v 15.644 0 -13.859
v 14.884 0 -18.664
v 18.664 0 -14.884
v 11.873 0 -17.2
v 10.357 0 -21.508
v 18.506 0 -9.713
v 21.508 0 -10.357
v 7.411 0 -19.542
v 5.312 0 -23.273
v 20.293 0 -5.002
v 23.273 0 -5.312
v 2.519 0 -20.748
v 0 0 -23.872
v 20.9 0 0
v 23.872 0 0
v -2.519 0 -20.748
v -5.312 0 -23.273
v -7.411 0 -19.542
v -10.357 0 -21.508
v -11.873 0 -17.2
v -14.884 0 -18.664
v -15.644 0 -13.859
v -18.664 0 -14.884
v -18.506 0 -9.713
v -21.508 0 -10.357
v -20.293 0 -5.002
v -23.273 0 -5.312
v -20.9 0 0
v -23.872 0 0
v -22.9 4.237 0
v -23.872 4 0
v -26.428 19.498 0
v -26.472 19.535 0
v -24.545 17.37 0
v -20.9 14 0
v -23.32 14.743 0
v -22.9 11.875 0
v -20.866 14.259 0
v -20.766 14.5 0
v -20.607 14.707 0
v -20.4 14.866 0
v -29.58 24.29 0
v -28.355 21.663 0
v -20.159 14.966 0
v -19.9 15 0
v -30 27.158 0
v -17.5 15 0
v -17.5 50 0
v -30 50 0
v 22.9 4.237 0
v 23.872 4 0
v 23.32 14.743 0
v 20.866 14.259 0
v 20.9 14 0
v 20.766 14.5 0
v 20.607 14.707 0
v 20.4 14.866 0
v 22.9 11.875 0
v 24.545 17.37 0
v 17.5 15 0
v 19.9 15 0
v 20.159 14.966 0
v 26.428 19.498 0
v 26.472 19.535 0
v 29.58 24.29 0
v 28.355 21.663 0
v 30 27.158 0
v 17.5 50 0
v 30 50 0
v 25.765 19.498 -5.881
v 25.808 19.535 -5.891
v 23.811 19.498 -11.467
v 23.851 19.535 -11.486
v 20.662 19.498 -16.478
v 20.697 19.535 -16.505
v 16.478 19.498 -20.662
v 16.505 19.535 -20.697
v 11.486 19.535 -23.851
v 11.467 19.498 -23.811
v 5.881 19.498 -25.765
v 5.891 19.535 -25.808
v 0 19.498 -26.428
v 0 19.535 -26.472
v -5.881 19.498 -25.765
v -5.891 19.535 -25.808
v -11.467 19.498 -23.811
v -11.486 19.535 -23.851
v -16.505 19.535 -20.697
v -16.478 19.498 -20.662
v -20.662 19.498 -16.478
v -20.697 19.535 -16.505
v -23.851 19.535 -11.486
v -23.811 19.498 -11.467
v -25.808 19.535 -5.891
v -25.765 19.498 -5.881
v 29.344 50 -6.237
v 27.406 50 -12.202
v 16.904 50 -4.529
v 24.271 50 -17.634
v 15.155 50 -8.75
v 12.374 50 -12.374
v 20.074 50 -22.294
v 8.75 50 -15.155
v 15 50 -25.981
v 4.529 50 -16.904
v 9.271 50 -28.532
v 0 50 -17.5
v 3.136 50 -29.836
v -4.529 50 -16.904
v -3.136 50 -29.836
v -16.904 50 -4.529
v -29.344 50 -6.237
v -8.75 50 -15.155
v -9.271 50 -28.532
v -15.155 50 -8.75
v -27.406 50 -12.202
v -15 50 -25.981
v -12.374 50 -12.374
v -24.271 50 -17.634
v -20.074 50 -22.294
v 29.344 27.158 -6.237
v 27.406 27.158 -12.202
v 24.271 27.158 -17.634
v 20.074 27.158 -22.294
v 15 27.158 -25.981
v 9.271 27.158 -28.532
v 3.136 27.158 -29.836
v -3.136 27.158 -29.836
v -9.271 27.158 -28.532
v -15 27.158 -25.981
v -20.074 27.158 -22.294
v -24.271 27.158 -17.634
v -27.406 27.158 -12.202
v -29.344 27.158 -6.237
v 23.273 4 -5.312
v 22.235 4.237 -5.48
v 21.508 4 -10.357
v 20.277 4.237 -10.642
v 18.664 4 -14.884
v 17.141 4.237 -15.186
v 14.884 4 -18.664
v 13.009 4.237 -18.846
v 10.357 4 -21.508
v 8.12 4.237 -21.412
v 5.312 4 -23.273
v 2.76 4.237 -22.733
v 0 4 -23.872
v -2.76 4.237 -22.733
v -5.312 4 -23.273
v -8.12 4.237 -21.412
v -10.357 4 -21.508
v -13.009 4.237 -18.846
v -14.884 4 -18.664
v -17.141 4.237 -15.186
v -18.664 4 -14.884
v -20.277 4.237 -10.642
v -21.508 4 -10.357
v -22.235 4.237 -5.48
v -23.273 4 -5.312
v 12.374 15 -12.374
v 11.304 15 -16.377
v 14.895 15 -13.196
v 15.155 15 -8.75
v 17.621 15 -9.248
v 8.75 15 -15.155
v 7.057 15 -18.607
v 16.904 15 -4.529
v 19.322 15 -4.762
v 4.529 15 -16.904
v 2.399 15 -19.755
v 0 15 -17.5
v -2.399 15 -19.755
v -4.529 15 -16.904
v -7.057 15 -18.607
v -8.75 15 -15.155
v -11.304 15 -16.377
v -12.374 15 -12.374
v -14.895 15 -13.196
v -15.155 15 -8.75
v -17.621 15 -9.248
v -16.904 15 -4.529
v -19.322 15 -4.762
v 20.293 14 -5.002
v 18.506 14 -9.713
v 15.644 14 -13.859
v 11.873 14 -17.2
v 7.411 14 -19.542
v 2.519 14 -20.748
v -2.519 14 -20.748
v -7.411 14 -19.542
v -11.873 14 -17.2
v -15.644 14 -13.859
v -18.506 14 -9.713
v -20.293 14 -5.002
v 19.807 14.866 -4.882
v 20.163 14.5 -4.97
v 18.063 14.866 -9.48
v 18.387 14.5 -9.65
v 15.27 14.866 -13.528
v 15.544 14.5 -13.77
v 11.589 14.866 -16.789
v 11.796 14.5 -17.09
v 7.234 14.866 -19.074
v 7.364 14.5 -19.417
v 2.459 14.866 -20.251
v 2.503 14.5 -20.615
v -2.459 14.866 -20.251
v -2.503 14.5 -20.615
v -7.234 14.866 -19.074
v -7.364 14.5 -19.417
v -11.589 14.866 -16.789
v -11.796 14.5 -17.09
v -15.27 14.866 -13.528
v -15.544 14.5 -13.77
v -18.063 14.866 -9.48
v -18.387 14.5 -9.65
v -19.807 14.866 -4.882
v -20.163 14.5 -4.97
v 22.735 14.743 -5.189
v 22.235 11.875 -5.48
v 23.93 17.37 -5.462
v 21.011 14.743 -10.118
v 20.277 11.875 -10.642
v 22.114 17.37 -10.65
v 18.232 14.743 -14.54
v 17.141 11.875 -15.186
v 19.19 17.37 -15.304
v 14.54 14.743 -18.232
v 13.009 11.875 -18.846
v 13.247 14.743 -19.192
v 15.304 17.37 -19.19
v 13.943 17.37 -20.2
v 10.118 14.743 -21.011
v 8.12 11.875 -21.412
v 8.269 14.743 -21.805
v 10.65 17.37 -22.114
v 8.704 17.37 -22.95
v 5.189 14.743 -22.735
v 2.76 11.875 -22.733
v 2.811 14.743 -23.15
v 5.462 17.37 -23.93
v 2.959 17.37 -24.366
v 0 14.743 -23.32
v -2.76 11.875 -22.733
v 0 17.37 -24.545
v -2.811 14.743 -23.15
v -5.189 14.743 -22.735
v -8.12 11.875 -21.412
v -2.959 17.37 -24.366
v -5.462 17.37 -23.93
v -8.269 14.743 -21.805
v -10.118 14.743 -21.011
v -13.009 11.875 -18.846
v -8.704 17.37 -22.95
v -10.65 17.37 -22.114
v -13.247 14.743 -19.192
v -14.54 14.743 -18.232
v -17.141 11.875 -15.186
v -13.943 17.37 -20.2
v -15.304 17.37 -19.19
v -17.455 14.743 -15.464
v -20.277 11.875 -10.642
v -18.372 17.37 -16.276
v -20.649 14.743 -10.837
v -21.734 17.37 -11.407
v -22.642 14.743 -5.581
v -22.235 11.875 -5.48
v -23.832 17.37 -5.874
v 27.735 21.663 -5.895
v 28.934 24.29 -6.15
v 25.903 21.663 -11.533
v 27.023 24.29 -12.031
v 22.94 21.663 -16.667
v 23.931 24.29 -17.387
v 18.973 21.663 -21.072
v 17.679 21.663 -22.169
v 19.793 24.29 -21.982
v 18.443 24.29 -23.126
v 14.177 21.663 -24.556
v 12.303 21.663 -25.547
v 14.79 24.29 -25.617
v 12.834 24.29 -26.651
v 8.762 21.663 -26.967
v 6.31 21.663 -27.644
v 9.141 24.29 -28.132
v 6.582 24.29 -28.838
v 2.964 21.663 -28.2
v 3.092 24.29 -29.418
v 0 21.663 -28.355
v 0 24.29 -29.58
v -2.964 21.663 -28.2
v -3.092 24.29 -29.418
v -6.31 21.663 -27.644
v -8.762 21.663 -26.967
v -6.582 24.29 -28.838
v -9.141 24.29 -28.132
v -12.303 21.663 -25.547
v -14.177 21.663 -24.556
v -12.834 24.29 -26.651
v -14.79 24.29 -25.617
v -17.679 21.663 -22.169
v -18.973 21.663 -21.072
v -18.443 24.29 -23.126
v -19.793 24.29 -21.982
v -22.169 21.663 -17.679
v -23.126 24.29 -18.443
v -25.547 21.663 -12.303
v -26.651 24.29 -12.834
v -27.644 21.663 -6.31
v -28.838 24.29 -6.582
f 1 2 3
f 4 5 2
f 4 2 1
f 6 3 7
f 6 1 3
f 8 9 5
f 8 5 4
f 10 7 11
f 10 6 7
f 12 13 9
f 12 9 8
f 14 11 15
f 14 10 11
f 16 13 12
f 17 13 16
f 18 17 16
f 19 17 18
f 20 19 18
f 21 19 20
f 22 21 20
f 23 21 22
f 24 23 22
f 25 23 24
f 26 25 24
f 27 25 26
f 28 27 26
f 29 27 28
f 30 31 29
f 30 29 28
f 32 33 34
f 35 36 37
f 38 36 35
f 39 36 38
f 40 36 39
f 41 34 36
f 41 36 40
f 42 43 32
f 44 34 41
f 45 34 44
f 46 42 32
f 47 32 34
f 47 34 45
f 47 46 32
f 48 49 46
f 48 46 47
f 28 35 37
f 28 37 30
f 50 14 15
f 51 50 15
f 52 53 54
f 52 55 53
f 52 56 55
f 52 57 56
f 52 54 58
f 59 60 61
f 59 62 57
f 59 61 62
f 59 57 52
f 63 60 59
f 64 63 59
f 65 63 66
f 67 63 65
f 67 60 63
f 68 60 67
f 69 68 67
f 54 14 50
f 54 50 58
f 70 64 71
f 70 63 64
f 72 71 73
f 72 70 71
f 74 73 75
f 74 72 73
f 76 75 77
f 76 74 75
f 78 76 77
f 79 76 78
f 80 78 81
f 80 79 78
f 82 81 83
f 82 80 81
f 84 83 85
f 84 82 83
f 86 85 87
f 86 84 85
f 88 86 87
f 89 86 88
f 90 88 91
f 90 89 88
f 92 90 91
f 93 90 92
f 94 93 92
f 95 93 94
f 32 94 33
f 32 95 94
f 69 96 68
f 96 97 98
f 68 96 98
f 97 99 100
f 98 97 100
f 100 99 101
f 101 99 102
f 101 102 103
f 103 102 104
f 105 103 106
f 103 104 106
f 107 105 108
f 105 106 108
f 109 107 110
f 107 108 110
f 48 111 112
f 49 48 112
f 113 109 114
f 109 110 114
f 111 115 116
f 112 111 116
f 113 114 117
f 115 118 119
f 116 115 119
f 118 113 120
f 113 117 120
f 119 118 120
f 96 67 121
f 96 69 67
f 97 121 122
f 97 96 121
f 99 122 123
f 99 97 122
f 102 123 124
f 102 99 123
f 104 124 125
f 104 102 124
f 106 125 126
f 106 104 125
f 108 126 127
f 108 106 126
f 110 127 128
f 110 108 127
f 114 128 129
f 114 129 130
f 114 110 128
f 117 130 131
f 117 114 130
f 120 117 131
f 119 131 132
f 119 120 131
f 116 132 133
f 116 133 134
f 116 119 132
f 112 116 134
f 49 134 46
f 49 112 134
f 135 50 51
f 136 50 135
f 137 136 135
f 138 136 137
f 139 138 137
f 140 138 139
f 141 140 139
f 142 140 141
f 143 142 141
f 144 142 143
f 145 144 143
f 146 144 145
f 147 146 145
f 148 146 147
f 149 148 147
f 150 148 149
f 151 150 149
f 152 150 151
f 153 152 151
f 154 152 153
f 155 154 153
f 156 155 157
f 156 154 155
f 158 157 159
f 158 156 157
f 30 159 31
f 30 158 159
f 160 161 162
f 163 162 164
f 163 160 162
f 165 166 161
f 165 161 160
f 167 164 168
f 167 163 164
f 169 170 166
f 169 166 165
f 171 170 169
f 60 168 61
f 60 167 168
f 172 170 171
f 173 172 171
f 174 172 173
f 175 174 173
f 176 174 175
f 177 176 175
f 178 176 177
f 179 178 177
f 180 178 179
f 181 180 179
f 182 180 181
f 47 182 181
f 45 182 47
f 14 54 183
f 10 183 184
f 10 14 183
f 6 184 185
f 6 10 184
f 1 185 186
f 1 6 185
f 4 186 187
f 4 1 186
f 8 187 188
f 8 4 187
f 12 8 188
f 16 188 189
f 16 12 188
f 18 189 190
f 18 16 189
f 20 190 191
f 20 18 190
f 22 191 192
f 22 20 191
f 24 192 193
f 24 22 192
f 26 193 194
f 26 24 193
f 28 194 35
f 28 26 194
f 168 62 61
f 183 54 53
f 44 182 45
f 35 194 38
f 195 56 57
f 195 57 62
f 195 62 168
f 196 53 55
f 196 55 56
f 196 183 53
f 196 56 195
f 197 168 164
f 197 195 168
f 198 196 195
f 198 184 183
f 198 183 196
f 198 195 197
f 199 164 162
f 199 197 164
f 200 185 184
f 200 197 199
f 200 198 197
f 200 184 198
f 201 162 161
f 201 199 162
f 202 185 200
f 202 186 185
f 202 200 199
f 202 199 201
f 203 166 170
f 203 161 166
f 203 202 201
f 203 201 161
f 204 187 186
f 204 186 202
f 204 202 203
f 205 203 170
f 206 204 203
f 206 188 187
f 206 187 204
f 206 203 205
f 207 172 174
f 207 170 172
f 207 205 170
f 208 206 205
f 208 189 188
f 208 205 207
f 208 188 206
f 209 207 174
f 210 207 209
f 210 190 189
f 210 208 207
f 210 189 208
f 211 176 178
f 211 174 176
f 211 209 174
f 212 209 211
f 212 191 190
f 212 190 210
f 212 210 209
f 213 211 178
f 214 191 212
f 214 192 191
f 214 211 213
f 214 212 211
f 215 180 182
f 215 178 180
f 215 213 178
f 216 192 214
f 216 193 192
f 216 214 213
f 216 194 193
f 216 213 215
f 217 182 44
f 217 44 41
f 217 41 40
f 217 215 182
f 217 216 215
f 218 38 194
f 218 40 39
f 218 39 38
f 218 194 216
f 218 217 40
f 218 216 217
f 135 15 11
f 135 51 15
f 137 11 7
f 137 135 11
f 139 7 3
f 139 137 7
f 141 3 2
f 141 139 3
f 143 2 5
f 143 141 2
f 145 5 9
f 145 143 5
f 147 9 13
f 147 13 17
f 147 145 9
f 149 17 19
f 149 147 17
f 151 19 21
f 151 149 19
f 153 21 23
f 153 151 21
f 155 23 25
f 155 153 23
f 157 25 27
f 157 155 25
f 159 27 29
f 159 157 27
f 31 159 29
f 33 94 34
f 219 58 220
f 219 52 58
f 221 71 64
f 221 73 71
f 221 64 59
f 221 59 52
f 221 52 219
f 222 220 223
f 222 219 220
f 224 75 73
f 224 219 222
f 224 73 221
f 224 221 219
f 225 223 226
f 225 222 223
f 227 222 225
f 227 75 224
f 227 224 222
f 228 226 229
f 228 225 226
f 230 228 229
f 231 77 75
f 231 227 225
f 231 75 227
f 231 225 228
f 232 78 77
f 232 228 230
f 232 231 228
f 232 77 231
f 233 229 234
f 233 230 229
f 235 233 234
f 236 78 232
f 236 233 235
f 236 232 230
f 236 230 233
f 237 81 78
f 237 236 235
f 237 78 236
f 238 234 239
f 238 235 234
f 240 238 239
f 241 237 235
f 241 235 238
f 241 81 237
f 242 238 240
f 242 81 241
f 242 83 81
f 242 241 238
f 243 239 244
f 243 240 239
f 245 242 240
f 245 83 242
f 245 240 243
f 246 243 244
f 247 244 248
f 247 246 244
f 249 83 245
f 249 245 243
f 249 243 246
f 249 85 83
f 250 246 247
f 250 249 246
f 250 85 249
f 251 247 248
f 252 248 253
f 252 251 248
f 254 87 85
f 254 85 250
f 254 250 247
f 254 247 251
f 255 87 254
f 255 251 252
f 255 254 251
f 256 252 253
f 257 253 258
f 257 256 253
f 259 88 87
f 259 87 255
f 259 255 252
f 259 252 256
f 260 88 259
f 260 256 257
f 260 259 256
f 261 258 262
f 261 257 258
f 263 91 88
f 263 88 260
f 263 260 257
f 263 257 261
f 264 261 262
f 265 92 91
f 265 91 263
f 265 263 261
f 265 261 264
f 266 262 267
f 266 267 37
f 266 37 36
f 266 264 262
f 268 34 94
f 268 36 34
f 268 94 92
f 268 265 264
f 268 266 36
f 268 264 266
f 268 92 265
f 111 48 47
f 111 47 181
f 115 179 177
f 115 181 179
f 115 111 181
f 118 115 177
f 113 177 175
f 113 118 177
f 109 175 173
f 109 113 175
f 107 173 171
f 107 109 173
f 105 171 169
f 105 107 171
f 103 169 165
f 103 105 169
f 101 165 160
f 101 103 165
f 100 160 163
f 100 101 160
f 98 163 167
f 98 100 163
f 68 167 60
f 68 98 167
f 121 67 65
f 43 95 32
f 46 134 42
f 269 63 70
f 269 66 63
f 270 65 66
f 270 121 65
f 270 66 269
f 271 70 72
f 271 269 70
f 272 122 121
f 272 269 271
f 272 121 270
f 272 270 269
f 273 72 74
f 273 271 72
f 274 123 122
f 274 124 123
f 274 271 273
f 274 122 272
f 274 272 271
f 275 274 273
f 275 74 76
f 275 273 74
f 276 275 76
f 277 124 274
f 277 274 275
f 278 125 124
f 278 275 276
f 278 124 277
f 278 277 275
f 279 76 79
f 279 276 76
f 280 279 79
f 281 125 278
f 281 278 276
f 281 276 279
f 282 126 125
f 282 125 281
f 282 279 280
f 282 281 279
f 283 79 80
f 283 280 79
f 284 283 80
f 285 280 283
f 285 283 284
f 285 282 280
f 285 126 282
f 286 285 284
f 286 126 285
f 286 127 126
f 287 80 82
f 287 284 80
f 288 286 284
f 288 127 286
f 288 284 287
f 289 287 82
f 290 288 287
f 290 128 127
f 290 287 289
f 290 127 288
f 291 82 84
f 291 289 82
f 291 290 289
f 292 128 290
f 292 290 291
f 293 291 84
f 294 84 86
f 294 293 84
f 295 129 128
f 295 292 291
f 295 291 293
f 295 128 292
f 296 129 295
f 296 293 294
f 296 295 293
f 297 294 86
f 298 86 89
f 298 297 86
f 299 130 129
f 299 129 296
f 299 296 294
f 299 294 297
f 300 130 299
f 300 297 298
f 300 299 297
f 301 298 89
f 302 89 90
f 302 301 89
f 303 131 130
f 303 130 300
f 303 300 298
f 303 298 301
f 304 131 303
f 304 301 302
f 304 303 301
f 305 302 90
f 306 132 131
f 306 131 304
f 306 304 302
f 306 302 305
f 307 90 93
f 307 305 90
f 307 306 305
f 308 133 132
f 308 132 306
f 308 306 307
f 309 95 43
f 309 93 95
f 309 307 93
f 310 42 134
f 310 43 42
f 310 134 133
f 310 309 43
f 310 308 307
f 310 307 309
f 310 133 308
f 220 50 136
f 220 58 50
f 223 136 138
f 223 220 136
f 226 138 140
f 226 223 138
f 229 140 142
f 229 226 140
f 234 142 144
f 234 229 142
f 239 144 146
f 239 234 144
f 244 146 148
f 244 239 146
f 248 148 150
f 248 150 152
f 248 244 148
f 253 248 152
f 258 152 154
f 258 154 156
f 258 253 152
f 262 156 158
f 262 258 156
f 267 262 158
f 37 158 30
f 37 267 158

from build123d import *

# Parameters (mm, degrees)
CUT_EXTRUDE3_DEPTH           = 25
CUT_EXTRUDE3_DEPTH_BACK      = 40
CUT_EXTRUDE5_START           = -5
CUT_EXTRUDE5_DEPTH           = 5
BOSS_EXTRUDE2_DEPTH          = 5
SKETCH14_R                   = 1
BOSS_EXTRUDE3_DEPTH          = 3
BOSS_EXTRUDE4_START          = 3
SKETCH15_R                   = 1
BOSS_EXTRUDE4_DEPTH          = 3
CUT_EXTRUDE6_DEPTH           = 22
SKETCH17_W                   = 7
SKETCH17_H                   = 20.303986046
CUT_REVOLVE1_ANGLE           = 45
CUT_REVOLVE1_OTHER_WAY_ANGLE = 45
INTERSECT1_OUTLINE_W         = 62
INTERSECT1_OUTLINE_H         = 54
INTERSECT1_DEPTH             = 31
INTERSECT1_START             = -5
INTERSECT1_2_OUTLINE_W       = 12
INTERSECT1_2_OUTLINE_H       = 4
INTERSECT1_2_DEPTH           = 5


with BuildPart() as part:
    # Sketch1 → Revolve1 (revolve)
    with BuildSketch(Plane.XY, mode=Mode.PRIVATE) as revolve1_sk:
        with BuildLine():
            Line((20.9, 0), (23.871591838, 0))
            Line((23.871591838, 0), (23.871591838, 4))
            Line((23.871591838, 4), (22.9, 4.236662843))
            Line((22.9, 4.236662843), (22.9, 11.874576818))
            ThreePointArc((22.9, 11.874576818), (23.83692213, 16.100759435), (26.472123903, 19.535021249))
            Line((26.472123903, 19.535021249), (26.427876097, 19.497892931))
            ThreePointArc((26.427876097, 19.497892931), (29.06307787, 22.932154745), (30, 27.158337362))
            Line((30, 27.158337362), (30, 50))
            ThreePointArc((30, 50), (28.828427125, 52.828427125), (26, 54))
            Line((26, 54), (0, 54))
            Line((0, 54), (0, 15))
            Line((0, 15), (19.9, 15))
            ThreePointArc((19.9, 15), (20.607106781, 14.707106781), (20.9, 14))
            Line((20.9, 14), (20.9, 0))
        make_face()
    revolve(revolve1_sk.sketch.rotate(Axis((0, 0, 0), (0, 1, 0)), 90), axis=Axis((0, 0, 0), (0, 1, 0)))

    # Sketch11 → Cut-Extrude3 (cut, two sides: drawn at the far end of the back side and taken through both)
    with BuildSketch(Plane(origin=(0, 19.535021249, 0), x_dir=(-1, 0, 0), z_dir=(0, -1, 0)).offset(-CUT_EXTRUDE3_DEPTH_BACK)):
        with BuildLine():
            Line((-17.5, 0), (17.5, 0))
            ThreePointArc((17.5, 0), (0, 17.5), (-17.5, 0))
        make_face()
    extrude(amount=CUT_EXTRUDE3_DEPTH + CUT_EXTRUDE3_DEPTH_BACK, mode=Mode.SUBTRACT)

    # Sketch9 → Cut-Extrude5 (cut)
    with BuildSketch(Plane(origin=(0, 50, 0), x_dir=(-1, 0, 0), z_dir=(0, -1, 0)).offset(CUT_EXTRUDE5_START)):
        with BuildLine():
            Line((-30, 0), (30, 0))
            ThreePointArc((30, 0), (0, 30), (-30, 0))
        make_face()
    extrude(amount=CUT_EXTRUDE5_DEPTH, mode=Mode.SUBTRACT)

    # Sketch13 → Boss-Extrude2 (add)
    with BuildSketch(Plane(origin=(0, 0, 0), x_dir=(-1, 0, 0), z_dir=(0, 0, -1))):
        with BuildLine():
            Line((22.5, 53.5), (26.5, 53.5))
            ThreePointArc((26.5, 53.5), (26.853553391, 53.353553391), (27, 53))
            Line((27, 53), (27, 51))
            ThreePointArc((27, 51), (26.853553391, 50.646446609), (26.5, 50.5))
            Line((26.5, 50.5), (22.5, 50.5))
            ThreePointArc((22.5, 50.5), (22.146446609, 50.646446609), (22, 51))
            Line((22, 51), (22, 53))
            ThreePointArc((22, 53), (22.146446609, 53.353553391), (22.5, 53.5))
        make_face()
        with BuildLine():
            Line((-26.5, 53.5), (-22.5, 53.5))
            ThreePointArc((-22.5, 53.5), (-22.146446609, 53.353553391), (-22, 53))
            Line((-22, 53), (-22, 51))
            ThreePointArc((-22, 51), (-22.146446609, 50.646446609), (-22.5, 50.5))
            Line((-22.5, 50.5), (-26.5, 50.5))
            ThreePointArc((-26.5, 50.5), (-26.853553391, 50.646446609), (-27, 51))
            Line((-27, 51), (-27, 53))
            ThreePointArc((-27, 53), (-26.853553391, 53.353553391), (-26.5, 53.5))
        make_face()
    extrude(amount=BOSS_EXTRUDE2_DEPTH)

    # Sketch14 → Boss-Extrude3 (add)
    with BuildSketch(Plane.ZY.offset(-22)):
        with Locations(Location((-3, 52, 0), (0, 0, 270))):
            Circle(SKETCH14_R)
    extrude(amount=BOSS_EXTRUDE3_DEPTH)

    # Sketch15 → Boss-Extrude4 (add)
    with BuildSketch(Plane(origin=(-22, 0, 0), x_dir=(0, 0, -1), z_dir=(1, 0, 0)).offset(BOSS_EXTRUDE4_START)):
        with Locations(Location((3, 52, 0), (0, 0, 270))):
            Circle(SKETCH15_R)
    extrude(amount=-BOSS_EXTRUDE4_DEPTH)

    # Sketch16 → Cut-Extrude6 (cut)
    with BuildSketch(Plane(origin=(0, 50, 0), x_dir=(-1, 0, 0), z_dir=(0, -1, 0))):
        with BuildLine():
            Line((25.690465157, -4), (-25.690465157, -4))
            ThreePointArc((-25.690465157, -4), (0, -26), (25.690465157, -4))
        make_face()
    extrude(amount=CUT_EXTRUDE6_DEPTH, mode=Mode.SUBTRACT)

    # Sketch17 → Cut-Revolve1 (revolve, cut)
    with BuildSketch(Plane(origin=(0, 0, 0), x_dir=(0, 0, -1), z_dir=(1, 0, 0))):
        with Locations((-28.883918314, 38.580330385)):
            Rectangle(SKETCH17_W, SKETCH17_H)
    revolve(axis=Axis((0, 0, 0), (0, 0.9999633813881498, 0.008557796607647805)), revolution_arc=CUT_REVOLVE1_ANGLE, mode=Mode.SUBTRACT)

    # Sketch17 → Cut-Revolve1 other way (revolve, cut)
    with BuildSketch(Plane(origin=(0, 0, 0), x_dir=(0, 0, -1), z_dir=(1, 0, 0))):
        with Locations((-28.883918314, 38.580330385)):
            Rectangle(SKETCH17_W, SKETCH17_H)
    revolve(axis=Axis((0, 0, 0), (0, -0.9999633813881498, -0.008557796607647805)), revolution_arc=CUT_REVOLVE1_OTHER_WAY_ANGLE, mode=Mode.SUBTRACT)

    # Intersect1: read off the stored shape, not the designer's step
    # Intersect1 outline → Intersect1 (cut)
    with BuildSketch(Plane.XY):
        with Locations((0, 27)):
            Rectangle(INTERSECT1_OUTLINE_W, INTERSECT1_OUTLINE_H)
    extrude(amount=INTERSECT1_DEPTH, mode=Mode.SUBTRACT)

    # Intersect1 2 outline → Intersect1 2 (cut)
    with BuildSketch(Plane.XY.offset(INTERSECT1_START)):
        with Locations((-25, 52)):
            Rectangle(INTERSECT1_2_OUTLINE_W, INTERSECT1_2_OUTLINE_H)
        with Locations((25, 52)):
            Rectangle(INTERSECT1_2_OUTLINE_W, INTERSECT1_2_OUTLINE_H)
    extrude(amount=INTERSECT1_2_DEPTH, mode=Mode.SUBTRACT)


solid = part.part
